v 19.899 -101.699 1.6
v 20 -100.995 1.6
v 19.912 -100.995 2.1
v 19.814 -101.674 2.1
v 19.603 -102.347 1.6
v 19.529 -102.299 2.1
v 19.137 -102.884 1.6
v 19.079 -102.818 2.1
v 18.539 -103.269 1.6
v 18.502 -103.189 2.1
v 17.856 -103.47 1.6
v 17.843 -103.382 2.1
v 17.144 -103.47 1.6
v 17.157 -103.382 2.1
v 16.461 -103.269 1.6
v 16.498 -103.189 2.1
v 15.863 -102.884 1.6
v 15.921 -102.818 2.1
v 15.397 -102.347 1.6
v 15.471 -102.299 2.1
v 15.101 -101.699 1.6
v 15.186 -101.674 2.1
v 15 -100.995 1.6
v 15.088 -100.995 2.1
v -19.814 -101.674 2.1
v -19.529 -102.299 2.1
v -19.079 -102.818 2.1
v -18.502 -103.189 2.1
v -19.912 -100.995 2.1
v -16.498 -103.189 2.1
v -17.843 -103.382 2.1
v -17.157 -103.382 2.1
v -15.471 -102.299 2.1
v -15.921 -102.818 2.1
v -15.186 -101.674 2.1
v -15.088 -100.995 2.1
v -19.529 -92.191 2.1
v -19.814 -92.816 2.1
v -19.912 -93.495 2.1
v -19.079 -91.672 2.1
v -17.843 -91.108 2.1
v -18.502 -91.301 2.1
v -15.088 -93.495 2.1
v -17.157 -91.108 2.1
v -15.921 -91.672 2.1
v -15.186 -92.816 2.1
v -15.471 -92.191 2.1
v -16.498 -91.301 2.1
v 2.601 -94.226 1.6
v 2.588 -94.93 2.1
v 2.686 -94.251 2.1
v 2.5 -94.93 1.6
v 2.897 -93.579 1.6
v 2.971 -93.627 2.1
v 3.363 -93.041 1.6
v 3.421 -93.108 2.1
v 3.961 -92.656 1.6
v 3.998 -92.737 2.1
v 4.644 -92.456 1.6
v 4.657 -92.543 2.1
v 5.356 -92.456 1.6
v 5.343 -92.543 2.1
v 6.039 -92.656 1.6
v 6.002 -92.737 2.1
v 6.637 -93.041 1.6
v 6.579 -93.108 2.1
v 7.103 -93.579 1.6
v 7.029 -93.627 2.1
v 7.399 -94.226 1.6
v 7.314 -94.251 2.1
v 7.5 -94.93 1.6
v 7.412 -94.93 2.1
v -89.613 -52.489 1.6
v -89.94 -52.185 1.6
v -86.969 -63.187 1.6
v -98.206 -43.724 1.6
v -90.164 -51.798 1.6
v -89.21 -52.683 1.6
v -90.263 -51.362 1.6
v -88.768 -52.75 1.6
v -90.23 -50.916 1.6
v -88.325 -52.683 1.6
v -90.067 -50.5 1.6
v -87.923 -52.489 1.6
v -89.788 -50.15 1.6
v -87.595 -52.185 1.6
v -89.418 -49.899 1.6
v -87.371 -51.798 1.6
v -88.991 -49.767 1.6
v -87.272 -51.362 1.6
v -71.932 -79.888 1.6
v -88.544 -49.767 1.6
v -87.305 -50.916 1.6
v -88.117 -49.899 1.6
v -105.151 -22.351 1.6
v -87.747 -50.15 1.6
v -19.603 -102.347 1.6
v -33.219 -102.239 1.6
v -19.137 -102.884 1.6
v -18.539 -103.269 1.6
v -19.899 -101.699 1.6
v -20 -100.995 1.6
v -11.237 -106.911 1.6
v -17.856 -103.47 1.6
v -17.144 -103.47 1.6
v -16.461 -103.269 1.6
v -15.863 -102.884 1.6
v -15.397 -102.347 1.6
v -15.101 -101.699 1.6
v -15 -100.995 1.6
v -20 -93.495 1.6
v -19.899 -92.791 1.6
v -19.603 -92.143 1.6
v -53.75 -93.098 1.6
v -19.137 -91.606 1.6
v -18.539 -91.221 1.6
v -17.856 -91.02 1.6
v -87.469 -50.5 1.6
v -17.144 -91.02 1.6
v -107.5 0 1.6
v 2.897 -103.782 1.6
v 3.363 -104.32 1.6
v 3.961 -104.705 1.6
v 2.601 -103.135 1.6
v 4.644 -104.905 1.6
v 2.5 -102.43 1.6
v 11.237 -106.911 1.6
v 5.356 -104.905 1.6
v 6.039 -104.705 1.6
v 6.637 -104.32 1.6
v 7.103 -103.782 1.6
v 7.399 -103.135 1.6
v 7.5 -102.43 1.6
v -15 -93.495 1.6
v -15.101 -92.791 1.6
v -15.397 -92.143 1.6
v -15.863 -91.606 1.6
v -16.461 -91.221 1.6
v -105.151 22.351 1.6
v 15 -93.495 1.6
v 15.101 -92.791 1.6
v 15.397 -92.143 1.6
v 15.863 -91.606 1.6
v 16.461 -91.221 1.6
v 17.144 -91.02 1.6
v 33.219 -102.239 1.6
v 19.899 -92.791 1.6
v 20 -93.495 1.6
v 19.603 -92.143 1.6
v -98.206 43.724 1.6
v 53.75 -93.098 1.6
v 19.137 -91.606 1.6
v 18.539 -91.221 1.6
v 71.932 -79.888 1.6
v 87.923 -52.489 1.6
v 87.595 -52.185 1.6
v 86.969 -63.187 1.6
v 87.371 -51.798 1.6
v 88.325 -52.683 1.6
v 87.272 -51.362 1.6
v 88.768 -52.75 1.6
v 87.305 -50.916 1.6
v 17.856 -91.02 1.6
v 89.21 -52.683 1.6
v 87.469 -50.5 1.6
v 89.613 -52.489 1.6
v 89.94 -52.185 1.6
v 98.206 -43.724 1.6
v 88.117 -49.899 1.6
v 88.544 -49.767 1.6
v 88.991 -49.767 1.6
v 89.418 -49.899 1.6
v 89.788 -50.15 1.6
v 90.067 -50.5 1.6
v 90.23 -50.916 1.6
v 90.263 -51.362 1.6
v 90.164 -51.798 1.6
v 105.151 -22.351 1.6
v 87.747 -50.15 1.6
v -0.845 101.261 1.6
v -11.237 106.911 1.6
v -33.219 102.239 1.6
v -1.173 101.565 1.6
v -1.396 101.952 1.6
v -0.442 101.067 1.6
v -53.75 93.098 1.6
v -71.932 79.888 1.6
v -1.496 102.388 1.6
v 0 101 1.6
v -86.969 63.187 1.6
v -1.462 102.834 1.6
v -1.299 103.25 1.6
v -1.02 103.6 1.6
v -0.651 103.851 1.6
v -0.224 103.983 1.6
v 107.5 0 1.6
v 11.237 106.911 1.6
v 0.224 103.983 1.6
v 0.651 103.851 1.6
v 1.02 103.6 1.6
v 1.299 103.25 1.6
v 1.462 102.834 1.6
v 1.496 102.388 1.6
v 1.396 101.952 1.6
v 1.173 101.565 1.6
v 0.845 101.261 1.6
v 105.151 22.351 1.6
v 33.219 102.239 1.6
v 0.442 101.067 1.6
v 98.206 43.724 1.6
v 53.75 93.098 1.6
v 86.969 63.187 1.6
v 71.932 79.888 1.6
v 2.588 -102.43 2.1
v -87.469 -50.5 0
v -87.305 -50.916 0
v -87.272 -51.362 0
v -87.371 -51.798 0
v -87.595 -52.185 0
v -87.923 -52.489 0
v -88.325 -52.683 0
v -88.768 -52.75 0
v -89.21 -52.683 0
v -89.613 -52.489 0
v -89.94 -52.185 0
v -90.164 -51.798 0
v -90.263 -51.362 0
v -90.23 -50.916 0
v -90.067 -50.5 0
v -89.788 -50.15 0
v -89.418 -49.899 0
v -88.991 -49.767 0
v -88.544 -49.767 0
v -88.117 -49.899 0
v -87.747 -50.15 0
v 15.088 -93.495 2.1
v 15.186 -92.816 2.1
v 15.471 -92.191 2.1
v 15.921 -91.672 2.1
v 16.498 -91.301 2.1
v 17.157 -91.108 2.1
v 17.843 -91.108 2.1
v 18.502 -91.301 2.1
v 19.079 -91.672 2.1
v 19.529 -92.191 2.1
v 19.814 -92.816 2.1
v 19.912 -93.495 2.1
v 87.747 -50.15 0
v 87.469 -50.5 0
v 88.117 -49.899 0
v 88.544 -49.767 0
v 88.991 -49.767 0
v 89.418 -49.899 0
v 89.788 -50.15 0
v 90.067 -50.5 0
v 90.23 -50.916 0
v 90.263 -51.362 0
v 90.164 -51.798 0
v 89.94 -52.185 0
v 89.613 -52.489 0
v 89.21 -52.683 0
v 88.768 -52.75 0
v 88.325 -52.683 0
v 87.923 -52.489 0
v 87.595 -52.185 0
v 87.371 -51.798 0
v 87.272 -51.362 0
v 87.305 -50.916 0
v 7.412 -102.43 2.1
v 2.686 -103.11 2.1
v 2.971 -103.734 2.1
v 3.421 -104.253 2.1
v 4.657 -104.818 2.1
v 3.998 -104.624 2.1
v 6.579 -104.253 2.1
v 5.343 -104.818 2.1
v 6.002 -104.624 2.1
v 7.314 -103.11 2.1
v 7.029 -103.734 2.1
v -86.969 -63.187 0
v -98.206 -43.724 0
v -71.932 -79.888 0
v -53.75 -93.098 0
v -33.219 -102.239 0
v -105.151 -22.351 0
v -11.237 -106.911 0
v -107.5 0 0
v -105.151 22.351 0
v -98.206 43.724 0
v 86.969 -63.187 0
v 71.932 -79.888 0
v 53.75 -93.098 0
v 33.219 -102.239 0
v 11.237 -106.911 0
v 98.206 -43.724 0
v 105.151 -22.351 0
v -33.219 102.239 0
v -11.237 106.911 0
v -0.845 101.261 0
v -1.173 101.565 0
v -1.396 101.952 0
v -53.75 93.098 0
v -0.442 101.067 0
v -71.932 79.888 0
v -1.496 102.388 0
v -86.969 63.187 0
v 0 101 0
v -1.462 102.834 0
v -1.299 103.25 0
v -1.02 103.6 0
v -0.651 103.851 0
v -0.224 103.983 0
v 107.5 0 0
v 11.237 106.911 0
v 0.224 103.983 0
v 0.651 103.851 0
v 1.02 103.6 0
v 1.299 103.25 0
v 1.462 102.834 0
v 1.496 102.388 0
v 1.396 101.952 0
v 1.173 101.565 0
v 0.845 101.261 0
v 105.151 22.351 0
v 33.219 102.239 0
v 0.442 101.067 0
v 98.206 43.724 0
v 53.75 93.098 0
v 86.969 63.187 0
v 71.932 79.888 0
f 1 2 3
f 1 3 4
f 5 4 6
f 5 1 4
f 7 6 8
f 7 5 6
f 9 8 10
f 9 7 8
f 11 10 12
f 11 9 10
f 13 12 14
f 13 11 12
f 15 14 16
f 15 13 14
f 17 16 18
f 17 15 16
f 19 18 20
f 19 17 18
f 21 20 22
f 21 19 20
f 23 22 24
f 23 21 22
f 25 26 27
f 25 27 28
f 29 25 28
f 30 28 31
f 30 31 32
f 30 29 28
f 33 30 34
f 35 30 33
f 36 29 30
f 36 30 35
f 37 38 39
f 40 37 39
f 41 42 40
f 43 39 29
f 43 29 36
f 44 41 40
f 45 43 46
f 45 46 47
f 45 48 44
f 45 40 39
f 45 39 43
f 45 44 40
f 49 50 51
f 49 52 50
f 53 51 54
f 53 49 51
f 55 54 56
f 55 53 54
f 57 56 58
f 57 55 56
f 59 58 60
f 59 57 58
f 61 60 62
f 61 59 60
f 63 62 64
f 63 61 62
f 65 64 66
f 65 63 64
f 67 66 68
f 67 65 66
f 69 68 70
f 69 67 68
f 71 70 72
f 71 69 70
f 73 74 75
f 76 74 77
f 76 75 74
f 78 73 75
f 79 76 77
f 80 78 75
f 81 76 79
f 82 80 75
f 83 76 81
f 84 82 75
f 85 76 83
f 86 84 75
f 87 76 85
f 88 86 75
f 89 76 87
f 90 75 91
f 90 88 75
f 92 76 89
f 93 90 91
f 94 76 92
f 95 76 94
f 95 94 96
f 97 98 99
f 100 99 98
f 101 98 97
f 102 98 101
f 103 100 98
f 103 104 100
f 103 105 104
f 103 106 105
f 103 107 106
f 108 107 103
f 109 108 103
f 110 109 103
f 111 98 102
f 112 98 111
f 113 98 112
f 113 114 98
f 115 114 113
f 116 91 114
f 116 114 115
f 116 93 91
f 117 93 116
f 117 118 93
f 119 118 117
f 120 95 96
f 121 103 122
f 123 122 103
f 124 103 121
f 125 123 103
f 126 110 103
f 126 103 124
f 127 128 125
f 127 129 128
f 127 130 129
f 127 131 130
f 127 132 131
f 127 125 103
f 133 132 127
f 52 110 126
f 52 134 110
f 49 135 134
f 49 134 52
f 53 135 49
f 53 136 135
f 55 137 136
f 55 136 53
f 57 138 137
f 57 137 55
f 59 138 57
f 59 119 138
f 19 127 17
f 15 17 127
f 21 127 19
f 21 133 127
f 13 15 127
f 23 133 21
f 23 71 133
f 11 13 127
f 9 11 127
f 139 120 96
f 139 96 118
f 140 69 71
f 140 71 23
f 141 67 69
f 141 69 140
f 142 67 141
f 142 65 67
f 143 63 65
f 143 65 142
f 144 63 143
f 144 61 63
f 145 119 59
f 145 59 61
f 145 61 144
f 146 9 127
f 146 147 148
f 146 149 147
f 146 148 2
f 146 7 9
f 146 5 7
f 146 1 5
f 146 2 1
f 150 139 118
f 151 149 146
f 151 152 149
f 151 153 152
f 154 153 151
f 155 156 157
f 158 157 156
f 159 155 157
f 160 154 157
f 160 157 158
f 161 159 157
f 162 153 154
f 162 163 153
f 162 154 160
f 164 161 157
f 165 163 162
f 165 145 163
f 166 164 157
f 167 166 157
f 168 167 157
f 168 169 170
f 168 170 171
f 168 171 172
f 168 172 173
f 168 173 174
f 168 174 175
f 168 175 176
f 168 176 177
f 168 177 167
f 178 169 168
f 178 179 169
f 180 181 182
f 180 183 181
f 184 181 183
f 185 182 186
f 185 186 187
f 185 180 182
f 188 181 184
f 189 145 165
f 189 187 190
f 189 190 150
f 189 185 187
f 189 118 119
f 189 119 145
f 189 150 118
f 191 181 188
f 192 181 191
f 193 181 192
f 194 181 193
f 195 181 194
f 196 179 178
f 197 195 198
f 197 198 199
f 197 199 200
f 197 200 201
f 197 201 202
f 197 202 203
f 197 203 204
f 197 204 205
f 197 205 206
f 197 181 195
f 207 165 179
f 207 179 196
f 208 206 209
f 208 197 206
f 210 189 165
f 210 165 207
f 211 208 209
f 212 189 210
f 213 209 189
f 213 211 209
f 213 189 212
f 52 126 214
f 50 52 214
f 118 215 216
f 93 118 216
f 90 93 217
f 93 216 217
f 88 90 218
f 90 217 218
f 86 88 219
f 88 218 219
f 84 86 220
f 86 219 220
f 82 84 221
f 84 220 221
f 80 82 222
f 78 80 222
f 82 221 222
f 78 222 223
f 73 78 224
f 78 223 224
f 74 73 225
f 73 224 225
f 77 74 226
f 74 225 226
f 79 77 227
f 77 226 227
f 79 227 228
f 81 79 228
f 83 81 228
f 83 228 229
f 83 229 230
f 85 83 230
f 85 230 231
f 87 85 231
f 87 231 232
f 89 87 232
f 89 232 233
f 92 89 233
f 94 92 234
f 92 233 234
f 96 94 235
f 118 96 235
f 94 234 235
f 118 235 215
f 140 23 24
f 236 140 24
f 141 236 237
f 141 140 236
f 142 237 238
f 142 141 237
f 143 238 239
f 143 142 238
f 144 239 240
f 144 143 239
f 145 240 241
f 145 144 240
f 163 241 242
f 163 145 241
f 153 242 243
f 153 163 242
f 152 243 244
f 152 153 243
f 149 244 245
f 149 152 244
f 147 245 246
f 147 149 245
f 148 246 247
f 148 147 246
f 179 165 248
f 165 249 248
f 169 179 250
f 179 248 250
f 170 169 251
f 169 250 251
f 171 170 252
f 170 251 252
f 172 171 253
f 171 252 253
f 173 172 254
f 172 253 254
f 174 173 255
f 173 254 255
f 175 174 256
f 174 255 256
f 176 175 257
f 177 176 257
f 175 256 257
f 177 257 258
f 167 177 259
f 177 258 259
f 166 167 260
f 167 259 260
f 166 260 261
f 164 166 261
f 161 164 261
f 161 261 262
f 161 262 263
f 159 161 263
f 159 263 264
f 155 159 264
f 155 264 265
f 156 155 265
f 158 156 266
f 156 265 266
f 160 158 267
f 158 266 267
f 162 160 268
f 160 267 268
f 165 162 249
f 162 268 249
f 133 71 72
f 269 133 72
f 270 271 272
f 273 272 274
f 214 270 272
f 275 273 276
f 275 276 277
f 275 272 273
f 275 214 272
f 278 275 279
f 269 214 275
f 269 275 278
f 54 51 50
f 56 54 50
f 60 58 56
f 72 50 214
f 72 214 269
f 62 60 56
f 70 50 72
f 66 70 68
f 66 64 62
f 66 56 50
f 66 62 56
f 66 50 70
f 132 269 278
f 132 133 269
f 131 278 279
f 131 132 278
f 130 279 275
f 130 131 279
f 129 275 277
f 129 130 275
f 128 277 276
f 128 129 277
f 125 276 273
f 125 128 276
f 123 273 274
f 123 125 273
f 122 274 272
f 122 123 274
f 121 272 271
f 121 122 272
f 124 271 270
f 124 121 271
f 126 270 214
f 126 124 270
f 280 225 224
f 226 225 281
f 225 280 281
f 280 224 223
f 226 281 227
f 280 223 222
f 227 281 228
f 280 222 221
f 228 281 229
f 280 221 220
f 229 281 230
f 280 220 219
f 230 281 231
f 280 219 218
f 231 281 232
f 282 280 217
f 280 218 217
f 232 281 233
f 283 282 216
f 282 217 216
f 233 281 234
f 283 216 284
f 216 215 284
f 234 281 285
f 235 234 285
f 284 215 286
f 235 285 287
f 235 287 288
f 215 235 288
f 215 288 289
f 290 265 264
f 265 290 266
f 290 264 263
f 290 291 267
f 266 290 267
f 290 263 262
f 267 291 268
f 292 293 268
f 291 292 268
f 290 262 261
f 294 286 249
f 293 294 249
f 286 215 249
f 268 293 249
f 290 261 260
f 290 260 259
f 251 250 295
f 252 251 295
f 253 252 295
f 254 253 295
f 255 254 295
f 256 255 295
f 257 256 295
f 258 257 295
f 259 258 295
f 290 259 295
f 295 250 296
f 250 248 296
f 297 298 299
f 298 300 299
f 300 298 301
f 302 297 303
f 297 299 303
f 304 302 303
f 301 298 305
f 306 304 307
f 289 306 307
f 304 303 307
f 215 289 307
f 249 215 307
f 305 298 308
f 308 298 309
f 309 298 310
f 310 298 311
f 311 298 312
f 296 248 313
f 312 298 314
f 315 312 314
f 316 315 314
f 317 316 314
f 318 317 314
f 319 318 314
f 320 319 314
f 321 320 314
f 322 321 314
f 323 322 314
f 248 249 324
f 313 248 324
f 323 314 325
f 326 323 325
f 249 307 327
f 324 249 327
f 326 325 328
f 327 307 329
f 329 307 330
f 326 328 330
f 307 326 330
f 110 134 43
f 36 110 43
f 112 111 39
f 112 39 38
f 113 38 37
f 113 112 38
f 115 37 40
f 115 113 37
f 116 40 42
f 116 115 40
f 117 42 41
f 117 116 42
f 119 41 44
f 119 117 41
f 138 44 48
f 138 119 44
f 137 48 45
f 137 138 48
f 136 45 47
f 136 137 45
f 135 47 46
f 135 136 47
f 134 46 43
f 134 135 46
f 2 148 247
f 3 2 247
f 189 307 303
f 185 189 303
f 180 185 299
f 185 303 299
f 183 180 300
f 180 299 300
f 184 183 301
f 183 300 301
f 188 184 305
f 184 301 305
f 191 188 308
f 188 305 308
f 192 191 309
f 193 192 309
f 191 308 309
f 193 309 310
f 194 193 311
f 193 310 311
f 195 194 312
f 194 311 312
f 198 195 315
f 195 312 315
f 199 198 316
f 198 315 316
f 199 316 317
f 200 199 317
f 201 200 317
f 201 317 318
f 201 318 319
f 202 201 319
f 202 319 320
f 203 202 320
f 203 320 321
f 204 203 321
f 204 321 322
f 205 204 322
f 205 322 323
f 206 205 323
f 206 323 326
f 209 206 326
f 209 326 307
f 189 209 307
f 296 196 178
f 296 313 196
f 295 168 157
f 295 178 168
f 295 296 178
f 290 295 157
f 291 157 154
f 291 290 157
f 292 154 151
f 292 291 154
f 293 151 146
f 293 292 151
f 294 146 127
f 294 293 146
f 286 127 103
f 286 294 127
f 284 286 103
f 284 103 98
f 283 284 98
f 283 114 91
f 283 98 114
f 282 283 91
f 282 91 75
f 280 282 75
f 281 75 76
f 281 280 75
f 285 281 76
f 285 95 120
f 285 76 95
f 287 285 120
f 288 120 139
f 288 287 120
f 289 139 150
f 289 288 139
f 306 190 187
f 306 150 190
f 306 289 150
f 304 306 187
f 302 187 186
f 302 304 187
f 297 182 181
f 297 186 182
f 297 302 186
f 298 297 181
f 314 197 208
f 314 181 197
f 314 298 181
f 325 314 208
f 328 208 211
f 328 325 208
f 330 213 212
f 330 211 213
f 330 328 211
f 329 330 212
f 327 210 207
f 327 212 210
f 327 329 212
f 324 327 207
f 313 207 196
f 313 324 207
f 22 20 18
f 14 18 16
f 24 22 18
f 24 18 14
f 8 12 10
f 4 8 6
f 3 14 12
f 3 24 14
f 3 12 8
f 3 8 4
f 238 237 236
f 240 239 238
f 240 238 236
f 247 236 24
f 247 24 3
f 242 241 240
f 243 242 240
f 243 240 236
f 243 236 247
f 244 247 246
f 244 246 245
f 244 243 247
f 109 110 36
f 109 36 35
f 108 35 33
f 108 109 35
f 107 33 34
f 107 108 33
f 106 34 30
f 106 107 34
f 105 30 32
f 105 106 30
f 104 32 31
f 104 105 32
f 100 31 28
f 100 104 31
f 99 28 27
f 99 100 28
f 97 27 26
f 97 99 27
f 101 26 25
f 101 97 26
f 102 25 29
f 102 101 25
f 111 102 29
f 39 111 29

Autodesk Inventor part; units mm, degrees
ref_plane "YZ Plane" through (0, 0, 0) normal (1, 0, 0) x (0, 1, 0)
ref_plane "XZ Plane" through (0, 0, 0) normal (0, 1, 0) x (-1, 0, 0)
ref_plane "XY Plane" through (0, 0, 0) normal (0, 0, 1) x (1, 0, 0)
sketch "Sketch1" plane through (0, 0, 0) normal (0, 0, 1) x (1, 0, 0)
  circle A0 centre (0, 0) radius 107.5
  dimension "d0" = 215
extrude "Extrusion1" add sketch "Sketch1" along normal blind 1.6
sketch "Sketch2" plane through (0, 0, 1.6) normal (0, 0, 1) x (1, 0, 0)
  circle A0 centre (0, 0) radius 107.5 projected
  line L0 (0, 102.5) -> (0, 0) construction
  dimension "d3" = 102.5
hole "Hole1" at (0, 102.5, 1.6) direction (0, 0, -1) diameter 3 end through all
pattern_circular "Circular Pattern1" count 3 over 360 about axis through (0, 0, 0) along (0, 0, 1) of "Hole1"
sketch "Sketch3" plane through (0, 0, 1.6) normal (0, 0, 1) x (1, 0, 0)
  circle A0 centre (0, 0) radius 107.5 projected
  line L0 (-17.5, -93.495) -> (-17.5, -100.995) construction
  line L1 (-20, -93.495) -> (-20, -100.995)
  line L2 (-15, -100.995) -> (-15, -93.495)
  arc A1 (-15, -93.495) -> (-20, -93.495) centre (-17.5, -93.495) ccw
  arc A2 (-20, -100.995) -> (-15, -100.995) centre (-17.5, -100.995) ccw
  line L3 (5, -94.9305) -> (5, -102.4305) construction
  line L4 (2.5, -94.9305) -> (2.5, -102.4305)
  line L5 (7.5, -102.4305) -> (7.5, -94.9305)
  arc A3 (7.5, -94.9305) -> (2.5, -94.9305) centre (5, -94.9305) ccw
  arc A4 (2.5, -102.4305) -> (7.5, -102.4305) centre (5, -102.4305) ccw
  line L6 (17.5, -93.495) -> (17.5, -100.995) construction
  line L7 (15, -93.495) -> (15, -100.995)
  line L8 (20, -100.995) -> (20, -93.495)
  arc A5 (20, -93.495) -> (15, -93.495) centre (17.5, -93.495) ccw
  arc A6 (15, -100.995) -> (20, -100.995) centre (17.5, -100.995) ccw
  arc A7 (-17.5, -97.245) -> (17.5, -97.245) centre (0, 0) ccw construction
  line L9 (-17.5, -97.245) -> (17.5, -97.245) construction
  point P0 (5, -98.6805)
  dimension "d14" = 7.5
  dimension "d15" = 2.5
  dimension "d16" = 35
  dimension "d17" = 2.5
  dimension "d18" = 12.5
extrude "Extrusion2" add sketch "Sketch3" along normal blind 0.5 draft -10 contours A1 L2 A2 L1 | A3 L5 A4 L4 | A5 L8 A6 L7
properties part number "Heatbed_Geeetech_215mm"
